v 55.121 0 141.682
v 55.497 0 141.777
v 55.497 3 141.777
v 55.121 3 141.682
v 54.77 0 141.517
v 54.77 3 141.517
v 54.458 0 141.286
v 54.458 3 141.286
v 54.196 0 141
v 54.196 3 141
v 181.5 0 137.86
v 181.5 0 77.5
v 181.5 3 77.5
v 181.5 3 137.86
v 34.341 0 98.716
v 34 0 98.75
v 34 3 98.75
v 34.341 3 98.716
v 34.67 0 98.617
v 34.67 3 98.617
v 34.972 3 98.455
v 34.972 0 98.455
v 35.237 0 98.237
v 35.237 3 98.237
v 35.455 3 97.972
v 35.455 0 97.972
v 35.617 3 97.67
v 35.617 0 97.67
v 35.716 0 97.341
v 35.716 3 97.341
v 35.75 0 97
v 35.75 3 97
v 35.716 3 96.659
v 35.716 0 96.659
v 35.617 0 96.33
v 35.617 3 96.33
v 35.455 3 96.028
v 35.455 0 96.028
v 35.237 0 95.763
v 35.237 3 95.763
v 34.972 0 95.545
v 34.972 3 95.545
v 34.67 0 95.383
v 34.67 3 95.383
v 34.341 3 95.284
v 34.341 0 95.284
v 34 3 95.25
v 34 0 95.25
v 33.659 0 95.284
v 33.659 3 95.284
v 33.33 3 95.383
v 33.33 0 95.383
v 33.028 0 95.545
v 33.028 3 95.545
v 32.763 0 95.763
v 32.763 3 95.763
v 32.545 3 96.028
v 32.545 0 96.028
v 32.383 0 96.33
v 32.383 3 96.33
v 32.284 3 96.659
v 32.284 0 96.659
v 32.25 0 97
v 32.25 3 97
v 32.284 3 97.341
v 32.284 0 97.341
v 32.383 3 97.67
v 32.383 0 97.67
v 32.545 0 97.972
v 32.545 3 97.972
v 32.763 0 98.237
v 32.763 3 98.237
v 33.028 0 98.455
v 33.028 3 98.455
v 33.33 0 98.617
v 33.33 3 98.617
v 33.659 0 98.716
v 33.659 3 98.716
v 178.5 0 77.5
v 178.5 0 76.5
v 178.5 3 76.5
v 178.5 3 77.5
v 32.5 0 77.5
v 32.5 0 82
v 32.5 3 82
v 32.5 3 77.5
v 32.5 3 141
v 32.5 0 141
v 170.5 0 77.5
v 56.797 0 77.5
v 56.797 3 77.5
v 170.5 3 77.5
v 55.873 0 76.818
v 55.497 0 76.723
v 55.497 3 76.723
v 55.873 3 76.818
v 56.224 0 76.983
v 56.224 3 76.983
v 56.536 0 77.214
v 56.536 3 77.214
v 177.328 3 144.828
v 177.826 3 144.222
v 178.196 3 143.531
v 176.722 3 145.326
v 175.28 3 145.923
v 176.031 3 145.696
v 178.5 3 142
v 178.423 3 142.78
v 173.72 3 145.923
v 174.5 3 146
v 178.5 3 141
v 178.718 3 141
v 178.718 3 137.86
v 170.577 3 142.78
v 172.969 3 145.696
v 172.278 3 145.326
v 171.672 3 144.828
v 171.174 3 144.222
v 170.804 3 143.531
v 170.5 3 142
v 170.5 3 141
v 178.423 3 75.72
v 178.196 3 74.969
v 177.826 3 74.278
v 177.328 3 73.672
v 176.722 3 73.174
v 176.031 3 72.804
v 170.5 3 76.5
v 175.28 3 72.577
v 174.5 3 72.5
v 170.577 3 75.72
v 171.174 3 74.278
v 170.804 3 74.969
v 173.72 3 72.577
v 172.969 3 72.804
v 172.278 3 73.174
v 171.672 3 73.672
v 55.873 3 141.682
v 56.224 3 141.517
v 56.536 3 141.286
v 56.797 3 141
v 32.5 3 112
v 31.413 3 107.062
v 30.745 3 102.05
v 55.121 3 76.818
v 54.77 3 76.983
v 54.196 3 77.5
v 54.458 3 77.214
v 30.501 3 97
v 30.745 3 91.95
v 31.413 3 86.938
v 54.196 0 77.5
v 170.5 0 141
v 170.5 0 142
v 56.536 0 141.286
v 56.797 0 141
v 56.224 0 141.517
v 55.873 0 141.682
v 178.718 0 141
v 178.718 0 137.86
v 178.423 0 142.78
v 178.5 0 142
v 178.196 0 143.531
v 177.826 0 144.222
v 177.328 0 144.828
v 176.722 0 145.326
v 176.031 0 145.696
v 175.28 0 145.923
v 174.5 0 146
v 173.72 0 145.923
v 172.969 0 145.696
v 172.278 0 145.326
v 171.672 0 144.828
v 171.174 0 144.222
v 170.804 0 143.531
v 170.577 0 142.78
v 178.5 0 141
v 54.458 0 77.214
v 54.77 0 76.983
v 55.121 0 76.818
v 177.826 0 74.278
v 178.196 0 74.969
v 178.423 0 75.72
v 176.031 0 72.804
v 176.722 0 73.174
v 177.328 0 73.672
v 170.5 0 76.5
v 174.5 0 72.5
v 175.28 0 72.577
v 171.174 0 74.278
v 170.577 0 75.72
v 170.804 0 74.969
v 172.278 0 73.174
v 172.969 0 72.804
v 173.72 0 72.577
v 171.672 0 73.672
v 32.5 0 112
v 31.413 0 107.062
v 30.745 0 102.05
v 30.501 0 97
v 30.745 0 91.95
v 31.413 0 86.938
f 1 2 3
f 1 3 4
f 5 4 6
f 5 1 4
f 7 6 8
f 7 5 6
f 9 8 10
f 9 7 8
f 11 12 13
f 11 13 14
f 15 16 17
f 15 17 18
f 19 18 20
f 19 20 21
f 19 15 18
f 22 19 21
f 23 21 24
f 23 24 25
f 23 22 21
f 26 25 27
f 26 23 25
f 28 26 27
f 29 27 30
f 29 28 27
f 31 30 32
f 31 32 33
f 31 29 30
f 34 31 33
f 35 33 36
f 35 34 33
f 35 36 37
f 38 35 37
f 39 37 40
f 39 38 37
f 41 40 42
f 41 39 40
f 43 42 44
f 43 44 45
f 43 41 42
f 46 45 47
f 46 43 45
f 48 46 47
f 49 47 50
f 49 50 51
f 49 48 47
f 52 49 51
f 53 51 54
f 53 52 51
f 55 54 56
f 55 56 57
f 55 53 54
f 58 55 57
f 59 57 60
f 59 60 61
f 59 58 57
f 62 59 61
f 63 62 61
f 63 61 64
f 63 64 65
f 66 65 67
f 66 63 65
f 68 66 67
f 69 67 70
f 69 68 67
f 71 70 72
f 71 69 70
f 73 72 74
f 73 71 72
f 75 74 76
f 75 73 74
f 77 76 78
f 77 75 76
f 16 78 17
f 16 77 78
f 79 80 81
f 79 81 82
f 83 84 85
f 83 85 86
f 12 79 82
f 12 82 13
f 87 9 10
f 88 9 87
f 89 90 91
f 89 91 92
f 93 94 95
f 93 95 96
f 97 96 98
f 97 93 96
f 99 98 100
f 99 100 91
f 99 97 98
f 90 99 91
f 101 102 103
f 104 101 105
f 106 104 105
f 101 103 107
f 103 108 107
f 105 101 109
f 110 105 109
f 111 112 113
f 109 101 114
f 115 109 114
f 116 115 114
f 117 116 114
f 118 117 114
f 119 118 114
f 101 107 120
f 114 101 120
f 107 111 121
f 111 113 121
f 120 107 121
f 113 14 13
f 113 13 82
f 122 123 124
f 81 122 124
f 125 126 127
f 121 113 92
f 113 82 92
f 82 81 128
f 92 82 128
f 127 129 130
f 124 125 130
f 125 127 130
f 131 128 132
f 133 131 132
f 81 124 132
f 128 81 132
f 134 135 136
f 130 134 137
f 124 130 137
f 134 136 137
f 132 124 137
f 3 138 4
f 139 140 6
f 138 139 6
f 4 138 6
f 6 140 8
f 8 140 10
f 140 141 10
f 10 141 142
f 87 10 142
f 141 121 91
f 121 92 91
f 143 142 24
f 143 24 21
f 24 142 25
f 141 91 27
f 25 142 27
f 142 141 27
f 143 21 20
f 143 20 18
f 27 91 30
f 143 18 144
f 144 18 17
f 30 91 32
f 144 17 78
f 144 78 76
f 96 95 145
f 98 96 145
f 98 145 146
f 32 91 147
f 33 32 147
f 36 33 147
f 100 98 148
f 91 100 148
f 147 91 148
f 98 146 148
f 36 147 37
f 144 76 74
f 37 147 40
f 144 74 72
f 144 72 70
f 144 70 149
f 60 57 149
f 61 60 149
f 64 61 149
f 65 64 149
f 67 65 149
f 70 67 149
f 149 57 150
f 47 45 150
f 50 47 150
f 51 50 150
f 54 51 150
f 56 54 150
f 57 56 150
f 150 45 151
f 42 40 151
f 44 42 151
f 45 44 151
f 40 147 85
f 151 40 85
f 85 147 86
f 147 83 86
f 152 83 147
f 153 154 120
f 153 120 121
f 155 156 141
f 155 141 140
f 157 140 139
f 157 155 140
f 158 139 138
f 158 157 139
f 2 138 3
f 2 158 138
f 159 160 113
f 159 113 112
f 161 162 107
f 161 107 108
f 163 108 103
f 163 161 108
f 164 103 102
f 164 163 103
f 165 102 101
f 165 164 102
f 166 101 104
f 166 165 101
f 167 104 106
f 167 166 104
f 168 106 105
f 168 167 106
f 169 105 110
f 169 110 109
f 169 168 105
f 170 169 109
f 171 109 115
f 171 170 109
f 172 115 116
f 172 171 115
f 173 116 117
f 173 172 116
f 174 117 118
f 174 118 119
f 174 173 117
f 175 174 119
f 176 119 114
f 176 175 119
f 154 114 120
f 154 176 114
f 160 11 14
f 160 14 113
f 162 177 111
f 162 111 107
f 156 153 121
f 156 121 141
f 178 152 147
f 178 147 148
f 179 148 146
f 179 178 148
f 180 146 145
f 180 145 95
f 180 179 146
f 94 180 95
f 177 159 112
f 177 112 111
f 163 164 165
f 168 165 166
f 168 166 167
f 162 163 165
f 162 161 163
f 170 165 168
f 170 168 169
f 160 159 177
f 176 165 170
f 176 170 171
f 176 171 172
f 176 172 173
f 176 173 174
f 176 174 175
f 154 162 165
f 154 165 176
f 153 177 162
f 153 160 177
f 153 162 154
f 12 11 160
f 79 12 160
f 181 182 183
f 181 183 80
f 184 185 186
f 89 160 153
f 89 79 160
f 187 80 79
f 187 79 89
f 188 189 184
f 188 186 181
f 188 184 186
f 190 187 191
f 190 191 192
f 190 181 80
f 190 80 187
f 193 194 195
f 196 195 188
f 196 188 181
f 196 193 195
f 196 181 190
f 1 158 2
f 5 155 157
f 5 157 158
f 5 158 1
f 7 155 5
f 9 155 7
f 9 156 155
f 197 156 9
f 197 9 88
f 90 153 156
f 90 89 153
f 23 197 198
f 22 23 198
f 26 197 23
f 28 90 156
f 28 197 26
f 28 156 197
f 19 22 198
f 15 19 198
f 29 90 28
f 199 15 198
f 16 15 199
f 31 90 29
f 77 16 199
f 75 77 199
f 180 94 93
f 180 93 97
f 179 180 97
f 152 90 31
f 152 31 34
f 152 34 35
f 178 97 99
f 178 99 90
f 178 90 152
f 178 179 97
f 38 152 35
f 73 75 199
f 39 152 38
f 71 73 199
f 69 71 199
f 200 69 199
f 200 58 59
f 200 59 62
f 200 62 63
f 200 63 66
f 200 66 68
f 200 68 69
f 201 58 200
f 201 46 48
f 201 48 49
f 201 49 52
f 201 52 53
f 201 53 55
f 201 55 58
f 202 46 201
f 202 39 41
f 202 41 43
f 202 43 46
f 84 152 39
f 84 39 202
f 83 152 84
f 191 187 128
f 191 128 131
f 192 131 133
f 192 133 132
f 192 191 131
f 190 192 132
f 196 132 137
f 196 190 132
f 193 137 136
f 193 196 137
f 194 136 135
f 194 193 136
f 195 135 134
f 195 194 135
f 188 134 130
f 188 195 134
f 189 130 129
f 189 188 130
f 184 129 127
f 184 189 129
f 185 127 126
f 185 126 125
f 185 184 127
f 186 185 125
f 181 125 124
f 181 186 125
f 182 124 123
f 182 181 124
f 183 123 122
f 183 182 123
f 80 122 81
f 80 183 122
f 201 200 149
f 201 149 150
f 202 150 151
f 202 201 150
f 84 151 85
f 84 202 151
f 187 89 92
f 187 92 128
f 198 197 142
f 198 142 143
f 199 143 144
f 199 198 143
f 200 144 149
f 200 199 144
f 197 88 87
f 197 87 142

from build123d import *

# Parameters (mm, degrees)
CROQUIS1_R              = 1.750000001
SALIENTE_EXTRUIR1_DEPTH = 3


with BuildPart() as part:
    # Croquis1 → Saliente-Extruir1 (new body)
    with BuildSketch(Plane(origin=(0, 0, 0), x_dir=(1, 0, 0), z_dir=(0, 1, 0))):
        with BuildLine():
            Line((32.500000027, -77.500000065), (54.196483333, -77.500000065))
            ThreePointArc((54.196483333, -77.500000065), (54.770251601, -76.983361364), (55.496960614, -76.722555719))
            ThreePointArc((55.496960614, -76.722555719), (56.223669627, -76.983361364), (56.797437895, -77.500000065))
            Line((56.797437895, -77.500000065), (170.500000144, -77.500000065))
            Line((170.500000144, -77.500000065), (170.500000144, -76.500000065))
            ThreePointArc((170.500000144, -76.500000065), (174.500000147, -72.500000061), (178.500000151, -76.500000065))
            Line((178.500000151, -76.500000065), (178.500000151, -77.500000065))
            Line((178.500000151, -77.500000065), (181.500000153, -77.500000065))
            Line((181.500000153, -77.500000065), (181.500000153, -137.860356365))
            Line((181.500000153, -137.860356365), (178.718053625, -137.860356365))
            Line((178.718053625, -137.860356365), (178.718053625, -141.000000119))
            Line((178.718053625, -141.000000119), (178.500000151, -141.000000119))
            Line((178.500000151, -141.000000119), (178.500000151, -142.00000012))
            ThreePointArc((178.500000151, -142.00000012), (174.500000147, -146.000000123), (170.500000144, -142.00000012))
            Line((170.500000144, -142.00000012), (170.500000144, -141.000000119))
            Line((170.500000144, -141.000000119), (56.797437895, -141.000000119))
            ThreePointArc((56.797437895, -141.000000119), (56.223669627, -141.516638821), (55.496960614, -141.777444465))
            ThreePointArc((55.496960614, -141.777444465), (54.770251601, -141.516638821), (54.196483333, -141.000000119))
            Line((54.196483333, -141.000000119), (32.500000027, -141.000000119))
            Line((32.500000027, -141.000000119), (32.500000027, -112.000000094))
            ThreePointArc((32.500000027, -112.000000094), (31.025757989, -104.563270659), (30.501093828, -97.000000082))
            ThreePointArc((30.501093828, -97.000000082), (31.025757989, -89.436729506), (32.500000027, -82.000000069))
            Line((32.500000027, -82.000000069), (32.500000027, -77.500000065))
        make_face()
        with Locations(Location((34.000000029, -97.000000082, 0), (0, 0, 270))):
            Circle(CROQUIS1_R, mode=Mode.SUBTRACT)
    extrude(amount=SALIENTE_EXTRUIR1_DEPTH)


solid = part.part
